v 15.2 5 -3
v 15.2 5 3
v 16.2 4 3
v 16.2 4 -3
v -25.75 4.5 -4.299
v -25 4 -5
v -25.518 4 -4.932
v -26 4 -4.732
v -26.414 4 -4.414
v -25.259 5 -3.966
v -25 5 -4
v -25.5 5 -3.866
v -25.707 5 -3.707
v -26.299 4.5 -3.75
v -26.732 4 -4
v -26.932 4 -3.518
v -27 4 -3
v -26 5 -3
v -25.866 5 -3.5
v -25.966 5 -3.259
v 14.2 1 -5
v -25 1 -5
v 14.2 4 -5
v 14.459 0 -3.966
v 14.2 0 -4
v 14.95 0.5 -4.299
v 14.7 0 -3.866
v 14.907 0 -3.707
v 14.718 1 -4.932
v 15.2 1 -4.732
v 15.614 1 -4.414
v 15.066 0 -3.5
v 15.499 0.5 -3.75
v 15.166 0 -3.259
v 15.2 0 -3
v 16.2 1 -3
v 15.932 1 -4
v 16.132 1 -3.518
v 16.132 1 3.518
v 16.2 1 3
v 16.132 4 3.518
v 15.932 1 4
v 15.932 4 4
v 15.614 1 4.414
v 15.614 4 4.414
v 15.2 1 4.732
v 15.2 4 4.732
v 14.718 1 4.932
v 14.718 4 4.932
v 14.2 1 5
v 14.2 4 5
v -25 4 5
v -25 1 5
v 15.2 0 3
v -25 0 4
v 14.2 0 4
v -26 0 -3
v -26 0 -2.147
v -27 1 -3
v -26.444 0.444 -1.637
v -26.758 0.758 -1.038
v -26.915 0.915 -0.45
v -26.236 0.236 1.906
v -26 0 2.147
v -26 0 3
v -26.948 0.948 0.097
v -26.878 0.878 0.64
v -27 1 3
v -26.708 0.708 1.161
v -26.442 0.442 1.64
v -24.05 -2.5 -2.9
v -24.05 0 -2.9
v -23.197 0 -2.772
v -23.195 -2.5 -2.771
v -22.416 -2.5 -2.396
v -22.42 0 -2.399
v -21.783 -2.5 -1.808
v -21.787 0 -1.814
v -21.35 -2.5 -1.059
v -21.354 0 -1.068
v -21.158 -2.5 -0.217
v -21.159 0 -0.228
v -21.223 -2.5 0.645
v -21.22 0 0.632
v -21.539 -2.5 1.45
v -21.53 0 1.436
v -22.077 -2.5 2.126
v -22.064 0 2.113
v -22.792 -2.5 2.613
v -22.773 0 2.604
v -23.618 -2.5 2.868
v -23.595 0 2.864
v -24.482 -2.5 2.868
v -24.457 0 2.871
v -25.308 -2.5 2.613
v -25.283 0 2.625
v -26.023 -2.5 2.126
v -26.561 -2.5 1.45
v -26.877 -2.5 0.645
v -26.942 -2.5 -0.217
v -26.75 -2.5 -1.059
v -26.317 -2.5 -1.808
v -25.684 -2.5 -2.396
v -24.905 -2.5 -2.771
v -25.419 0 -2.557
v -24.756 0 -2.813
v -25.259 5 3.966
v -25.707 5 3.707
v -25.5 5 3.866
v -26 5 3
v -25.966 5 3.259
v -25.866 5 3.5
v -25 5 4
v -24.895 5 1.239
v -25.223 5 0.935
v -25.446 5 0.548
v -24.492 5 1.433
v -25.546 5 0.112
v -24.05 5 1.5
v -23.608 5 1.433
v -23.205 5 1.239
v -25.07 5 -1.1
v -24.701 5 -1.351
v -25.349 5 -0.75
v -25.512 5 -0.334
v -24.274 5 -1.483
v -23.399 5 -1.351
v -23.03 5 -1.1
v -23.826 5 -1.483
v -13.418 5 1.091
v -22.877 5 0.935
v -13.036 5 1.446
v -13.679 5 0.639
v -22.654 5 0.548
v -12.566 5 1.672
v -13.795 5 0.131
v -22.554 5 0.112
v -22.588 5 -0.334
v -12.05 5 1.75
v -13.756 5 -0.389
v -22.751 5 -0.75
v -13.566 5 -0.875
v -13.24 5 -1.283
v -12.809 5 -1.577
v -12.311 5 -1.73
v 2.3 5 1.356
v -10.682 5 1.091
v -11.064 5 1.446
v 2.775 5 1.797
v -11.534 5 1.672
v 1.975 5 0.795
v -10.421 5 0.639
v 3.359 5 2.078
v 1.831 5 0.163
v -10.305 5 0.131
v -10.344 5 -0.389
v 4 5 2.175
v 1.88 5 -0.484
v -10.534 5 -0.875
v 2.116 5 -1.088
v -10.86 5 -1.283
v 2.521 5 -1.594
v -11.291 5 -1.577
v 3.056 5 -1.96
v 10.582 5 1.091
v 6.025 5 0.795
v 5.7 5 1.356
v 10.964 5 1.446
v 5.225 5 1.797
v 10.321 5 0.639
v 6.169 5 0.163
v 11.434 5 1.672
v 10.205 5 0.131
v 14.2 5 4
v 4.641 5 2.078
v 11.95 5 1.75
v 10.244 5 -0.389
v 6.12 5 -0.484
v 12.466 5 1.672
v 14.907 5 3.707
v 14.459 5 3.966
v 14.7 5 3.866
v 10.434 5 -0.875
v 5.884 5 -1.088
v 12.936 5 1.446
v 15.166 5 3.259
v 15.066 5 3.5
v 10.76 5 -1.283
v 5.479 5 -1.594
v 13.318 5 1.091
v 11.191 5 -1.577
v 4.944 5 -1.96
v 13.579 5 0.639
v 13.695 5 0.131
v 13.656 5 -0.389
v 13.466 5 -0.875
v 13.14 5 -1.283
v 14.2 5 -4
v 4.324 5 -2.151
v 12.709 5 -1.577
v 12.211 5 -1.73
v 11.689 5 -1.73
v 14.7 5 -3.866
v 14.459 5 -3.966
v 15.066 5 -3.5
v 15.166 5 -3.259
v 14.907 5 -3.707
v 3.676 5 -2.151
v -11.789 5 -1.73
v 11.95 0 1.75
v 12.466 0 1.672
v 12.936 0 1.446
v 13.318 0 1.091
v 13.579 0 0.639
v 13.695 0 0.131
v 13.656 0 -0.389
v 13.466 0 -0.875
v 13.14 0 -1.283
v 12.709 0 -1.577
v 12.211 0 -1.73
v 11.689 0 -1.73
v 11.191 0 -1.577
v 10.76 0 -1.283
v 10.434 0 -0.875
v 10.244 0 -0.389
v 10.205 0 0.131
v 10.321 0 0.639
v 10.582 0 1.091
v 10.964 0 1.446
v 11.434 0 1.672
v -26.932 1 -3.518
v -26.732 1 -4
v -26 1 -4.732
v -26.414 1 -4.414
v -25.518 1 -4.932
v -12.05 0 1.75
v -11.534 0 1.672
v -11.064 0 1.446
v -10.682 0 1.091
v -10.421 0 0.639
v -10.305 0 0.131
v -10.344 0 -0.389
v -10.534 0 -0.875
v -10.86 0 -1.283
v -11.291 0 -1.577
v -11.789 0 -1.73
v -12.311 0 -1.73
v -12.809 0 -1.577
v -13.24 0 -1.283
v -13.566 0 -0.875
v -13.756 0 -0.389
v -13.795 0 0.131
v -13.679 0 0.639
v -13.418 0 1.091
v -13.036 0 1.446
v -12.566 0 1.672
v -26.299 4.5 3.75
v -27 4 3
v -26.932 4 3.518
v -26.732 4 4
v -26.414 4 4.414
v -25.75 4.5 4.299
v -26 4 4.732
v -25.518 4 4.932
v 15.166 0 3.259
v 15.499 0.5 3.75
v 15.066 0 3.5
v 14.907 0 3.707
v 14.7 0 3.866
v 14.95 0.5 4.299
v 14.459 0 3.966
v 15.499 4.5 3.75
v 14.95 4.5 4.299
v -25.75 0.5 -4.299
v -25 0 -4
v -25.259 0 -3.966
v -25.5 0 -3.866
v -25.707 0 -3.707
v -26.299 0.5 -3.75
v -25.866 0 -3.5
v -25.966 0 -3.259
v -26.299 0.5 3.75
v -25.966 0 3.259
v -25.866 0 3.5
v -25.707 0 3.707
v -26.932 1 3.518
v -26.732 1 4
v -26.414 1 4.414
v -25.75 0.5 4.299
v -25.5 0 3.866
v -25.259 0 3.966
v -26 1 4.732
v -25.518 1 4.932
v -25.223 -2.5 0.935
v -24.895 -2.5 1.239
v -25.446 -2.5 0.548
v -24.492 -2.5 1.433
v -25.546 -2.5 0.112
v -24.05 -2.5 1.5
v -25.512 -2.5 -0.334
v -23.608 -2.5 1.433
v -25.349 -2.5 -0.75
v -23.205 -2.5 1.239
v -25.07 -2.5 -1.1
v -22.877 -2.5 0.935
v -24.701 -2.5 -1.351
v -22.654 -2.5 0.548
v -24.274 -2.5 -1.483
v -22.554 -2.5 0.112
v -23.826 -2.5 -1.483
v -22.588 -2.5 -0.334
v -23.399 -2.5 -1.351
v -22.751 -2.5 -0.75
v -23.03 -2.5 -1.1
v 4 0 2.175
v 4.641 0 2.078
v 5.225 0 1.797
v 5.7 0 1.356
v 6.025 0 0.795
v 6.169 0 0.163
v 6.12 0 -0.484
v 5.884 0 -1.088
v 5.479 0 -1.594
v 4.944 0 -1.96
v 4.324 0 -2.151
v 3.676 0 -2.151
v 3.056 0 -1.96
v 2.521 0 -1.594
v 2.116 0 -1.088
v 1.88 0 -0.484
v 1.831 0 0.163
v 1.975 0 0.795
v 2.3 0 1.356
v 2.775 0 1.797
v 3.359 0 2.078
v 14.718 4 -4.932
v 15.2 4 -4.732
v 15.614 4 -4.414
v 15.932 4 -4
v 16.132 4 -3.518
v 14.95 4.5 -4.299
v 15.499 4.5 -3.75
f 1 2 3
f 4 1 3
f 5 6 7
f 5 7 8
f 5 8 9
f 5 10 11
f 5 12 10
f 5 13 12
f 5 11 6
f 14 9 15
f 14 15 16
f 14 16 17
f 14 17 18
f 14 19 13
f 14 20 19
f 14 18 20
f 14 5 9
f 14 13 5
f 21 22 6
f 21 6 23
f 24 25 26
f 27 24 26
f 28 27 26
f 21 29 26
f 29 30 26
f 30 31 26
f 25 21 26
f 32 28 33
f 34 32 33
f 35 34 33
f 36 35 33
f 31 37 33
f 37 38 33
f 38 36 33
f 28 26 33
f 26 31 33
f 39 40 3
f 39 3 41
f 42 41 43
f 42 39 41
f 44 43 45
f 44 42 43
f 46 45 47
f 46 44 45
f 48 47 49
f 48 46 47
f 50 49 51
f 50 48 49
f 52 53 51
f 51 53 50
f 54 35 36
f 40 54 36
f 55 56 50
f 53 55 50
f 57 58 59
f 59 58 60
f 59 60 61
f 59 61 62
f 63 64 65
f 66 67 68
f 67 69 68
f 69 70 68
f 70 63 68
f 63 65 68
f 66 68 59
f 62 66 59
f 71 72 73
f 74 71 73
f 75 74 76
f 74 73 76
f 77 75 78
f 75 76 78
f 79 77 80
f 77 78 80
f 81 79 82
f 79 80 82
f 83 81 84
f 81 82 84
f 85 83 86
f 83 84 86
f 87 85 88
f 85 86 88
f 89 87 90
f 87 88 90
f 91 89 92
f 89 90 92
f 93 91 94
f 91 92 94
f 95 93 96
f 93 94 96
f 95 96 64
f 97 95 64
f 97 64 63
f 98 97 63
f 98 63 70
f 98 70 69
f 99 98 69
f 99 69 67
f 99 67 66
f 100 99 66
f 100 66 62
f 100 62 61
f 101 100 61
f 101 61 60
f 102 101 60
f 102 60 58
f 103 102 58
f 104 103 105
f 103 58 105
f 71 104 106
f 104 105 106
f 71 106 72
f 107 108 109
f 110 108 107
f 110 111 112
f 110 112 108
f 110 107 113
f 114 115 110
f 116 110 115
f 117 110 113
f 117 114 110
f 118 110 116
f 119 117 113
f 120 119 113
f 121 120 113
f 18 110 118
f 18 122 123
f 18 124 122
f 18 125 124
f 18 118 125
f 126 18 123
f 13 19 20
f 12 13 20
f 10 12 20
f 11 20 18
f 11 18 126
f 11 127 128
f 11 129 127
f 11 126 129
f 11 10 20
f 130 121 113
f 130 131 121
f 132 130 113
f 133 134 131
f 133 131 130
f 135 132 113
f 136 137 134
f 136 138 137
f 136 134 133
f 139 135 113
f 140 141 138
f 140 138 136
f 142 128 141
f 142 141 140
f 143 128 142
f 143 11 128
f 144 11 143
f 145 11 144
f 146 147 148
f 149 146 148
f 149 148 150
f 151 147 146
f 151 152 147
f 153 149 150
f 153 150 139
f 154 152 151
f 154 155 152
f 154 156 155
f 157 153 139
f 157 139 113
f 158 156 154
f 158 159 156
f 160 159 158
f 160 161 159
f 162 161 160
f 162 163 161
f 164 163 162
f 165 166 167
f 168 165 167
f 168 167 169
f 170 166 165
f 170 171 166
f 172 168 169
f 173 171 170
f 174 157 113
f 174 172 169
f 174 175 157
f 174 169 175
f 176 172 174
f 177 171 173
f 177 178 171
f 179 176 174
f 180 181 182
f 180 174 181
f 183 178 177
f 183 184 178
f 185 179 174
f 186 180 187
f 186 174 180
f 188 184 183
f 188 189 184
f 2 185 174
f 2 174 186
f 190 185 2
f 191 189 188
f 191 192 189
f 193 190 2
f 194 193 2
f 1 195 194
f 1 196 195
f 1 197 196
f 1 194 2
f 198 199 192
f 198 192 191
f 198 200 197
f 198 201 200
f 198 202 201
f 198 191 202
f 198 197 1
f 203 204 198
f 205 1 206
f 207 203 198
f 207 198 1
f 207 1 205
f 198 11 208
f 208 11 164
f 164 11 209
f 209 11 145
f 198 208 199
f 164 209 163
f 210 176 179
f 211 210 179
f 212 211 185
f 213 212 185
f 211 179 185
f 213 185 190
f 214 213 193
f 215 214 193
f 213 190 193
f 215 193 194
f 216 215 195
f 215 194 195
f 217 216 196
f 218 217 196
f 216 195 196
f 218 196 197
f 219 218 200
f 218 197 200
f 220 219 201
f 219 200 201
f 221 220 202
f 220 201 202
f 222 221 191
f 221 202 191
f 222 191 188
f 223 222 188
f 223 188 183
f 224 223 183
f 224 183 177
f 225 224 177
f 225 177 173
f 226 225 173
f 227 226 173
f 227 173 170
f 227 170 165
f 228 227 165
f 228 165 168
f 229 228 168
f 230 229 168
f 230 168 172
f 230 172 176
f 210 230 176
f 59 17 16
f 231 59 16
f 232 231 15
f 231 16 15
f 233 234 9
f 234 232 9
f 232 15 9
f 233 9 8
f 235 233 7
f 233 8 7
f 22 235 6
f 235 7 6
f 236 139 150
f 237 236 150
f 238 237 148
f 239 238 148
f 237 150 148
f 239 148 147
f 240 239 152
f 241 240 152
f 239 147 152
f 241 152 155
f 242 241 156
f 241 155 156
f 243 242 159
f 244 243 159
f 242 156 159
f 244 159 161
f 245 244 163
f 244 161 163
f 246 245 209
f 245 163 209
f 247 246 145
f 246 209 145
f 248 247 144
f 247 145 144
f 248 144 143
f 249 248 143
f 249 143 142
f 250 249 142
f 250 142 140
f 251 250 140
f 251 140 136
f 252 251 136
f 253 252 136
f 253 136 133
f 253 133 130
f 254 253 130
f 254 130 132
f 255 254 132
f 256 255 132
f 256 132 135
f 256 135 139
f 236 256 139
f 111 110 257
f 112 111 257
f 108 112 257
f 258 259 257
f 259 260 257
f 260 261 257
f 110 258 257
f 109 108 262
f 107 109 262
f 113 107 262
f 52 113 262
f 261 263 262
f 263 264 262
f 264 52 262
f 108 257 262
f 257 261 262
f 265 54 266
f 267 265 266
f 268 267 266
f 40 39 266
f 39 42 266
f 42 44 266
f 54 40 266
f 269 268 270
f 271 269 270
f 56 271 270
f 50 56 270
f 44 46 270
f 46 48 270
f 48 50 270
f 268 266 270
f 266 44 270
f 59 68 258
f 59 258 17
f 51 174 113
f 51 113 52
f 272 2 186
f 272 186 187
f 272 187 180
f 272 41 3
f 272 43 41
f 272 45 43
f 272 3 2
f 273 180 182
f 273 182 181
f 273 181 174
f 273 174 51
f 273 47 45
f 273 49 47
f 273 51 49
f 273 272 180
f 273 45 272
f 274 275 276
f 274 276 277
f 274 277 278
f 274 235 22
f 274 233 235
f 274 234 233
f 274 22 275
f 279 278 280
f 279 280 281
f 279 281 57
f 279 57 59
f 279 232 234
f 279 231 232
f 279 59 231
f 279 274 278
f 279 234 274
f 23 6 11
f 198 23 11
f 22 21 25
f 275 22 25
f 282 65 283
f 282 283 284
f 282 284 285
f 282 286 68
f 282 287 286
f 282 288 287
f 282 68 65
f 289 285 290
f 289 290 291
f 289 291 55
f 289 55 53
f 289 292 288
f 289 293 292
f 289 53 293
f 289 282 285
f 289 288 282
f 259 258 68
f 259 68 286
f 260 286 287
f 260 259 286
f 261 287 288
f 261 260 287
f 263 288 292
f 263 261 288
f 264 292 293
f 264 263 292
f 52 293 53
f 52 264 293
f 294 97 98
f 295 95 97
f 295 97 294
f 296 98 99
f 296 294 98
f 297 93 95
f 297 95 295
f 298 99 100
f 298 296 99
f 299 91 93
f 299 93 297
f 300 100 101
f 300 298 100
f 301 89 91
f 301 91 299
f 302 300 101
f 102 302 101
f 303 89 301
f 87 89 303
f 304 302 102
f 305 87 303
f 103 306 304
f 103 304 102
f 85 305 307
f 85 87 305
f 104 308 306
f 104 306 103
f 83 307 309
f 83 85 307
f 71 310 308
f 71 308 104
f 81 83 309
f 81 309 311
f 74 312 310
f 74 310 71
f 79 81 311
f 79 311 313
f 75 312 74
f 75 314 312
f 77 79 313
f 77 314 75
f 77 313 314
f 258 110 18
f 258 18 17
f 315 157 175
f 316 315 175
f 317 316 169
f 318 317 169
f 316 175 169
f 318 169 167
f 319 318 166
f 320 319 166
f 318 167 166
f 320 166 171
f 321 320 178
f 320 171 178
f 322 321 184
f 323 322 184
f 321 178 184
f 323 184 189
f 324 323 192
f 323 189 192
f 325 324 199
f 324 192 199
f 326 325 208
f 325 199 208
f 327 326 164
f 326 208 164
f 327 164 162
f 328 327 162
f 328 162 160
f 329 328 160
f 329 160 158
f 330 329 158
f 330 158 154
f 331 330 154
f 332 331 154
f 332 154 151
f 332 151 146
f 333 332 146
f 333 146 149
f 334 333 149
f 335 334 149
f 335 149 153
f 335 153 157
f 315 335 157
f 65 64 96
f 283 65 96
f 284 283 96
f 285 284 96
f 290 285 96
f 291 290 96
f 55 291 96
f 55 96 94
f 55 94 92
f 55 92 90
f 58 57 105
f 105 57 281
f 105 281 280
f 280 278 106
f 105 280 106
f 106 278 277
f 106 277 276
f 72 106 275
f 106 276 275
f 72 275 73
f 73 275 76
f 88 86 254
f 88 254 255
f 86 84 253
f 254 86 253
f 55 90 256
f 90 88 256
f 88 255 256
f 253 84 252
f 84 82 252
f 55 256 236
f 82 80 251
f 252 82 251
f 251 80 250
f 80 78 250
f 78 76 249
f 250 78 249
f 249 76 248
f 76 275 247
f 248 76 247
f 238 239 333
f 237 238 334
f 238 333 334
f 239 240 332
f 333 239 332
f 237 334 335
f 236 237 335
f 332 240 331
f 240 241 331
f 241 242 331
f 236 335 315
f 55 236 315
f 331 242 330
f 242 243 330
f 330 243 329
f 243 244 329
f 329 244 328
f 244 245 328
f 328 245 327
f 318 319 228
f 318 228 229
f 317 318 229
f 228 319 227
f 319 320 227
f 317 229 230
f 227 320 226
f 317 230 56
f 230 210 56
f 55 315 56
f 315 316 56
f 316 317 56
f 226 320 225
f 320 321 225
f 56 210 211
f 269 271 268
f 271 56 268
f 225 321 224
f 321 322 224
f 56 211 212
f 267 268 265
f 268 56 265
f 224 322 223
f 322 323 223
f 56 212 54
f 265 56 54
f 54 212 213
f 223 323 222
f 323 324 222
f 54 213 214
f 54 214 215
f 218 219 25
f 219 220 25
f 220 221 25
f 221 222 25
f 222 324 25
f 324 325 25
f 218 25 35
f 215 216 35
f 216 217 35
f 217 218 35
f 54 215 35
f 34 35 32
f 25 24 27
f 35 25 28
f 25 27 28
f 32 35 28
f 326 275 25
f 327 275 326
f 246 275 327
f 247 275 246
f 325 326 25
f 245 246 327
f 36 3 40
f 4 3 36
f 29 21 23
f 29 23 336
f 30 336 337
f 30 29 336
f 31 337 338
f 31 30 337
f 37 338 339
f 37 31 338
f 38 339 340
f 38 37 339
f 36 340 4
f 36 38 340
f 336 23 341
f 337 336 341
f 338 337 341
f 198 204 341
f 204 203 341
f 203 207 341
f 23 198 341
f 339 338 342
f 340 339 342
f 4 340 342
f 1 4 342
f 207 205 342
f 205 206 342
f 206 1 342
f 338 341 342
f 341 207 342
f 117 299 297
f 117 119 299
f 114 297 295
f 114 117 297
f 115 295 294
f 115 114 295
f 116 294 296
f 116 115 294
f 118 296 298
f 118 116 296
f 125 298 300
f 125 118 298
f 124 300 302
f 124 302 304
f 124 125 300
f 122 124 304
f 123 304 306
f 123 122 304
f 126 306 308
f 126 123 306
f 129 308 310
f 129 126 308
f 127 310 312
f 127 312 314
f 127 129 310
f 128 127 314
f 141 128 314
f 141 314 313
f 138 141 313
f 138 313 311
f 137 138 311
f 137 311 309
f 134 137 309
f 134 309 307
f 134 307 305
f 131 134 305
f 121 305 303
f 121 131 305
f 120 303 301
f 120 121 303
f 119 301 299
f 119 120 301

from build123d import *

# Parameters (mm, degrees)
SKETCH1_W           = 54
SKETCH1_H           = 10
BOSS_EXTRUDE1_DEPTH = 5
SKETCH3_R           = 1.5
SKETCH3_R_2         = 2.175
SKETCH3_R_3         = 1.75
CUT_EXTRUDE1_DEPTH  = 7
FILLET1_R           = 2
SKETCH4_R           = 2.9
SKETCH4_R_2         = 1.5
BOSS_EXTRUDE2_DEPTH = 2.5
SKETCH5_W           = 14.628032649
SKETCH5_H           = 11.072623212
CUT_EXTRUDE2_DEPTH  = 10
FILLET2_R           = 2
CHAMFER1_SIZE       = 1


with BuildPart() as part:
    # Sketch1 → Boss-Extrude1 (new body)
    with BuildSketch(Plane(origin=(0, 0, 0), x_dir=(1, 0, 0), z_dir=(0, 1, 0))):
        Rectangle(SKETCH1_W, SKETCH1_H)
    extrude(amount=BOSS_EXTRUDE1_DEPTH)

    # Sketch3 → Cut-Extrude1 (cut)
    with BuildSketch(Plane(origin=(0, 5, 0), x_dir=(1, 0, 0), z_dir=(0, 1, 0))):
        with Locations(Location((-24.05, 0, 0), (0, 0, 270))):
            Circle(SKETCH3_R)
        with Locations(Location((4, 0, 0), (0, 0, 270))):
            Circle(SKETCH3_R_2)
        with Locations(Location((-12.05, 0, 0), (0, 0, 270))):
            Circle(SKETCH3_R_3)
        with Locations(Location((11.95, 0, 0), (0, 0, 270))):
            Circle(SKETCH3_R_3)
    extrude(amount=-CUT_EXTRUDE1_DEPTH, mode=Mode.SUBTRACT)

    # Fillet1
    fillet1_edges = [part.edges().sort_by_distance(p)[0] for p in [
        (27, 2.5, 5),
        (-27, 2.5, 5),
        (-27, 2.5, -5),
        (27, 2.5, -5),
    ]]
    fillet(fillet1_edges, radius=FILLET1_R)

    # Sketch4 → Boss-Extrude2 (add)
    with BuildSketch(Plane.XZ):
        with Locations(Location((-24.05, 0, 0), (0, 0, 270))):
            Circle(SKETCH4_R)
        with Locations(Location((-24.05, 0, 0), (0, 0, 90))):
            Circle(SKETCH4_R_2, mode=Mode.SUBTRACT)
    extrude(amount=BOSS_EXTRUDE2_DEPTH)

    # Sketch5 → Cut-Extrude2 (cut)
    with BuildSketch(Plane(origin=(0, 5, 0), x_dir=(1, 0, 0), z_dir=(0, 1, 0))):
        with Locations((23.514016324, -0.536311606)):
            Rectangle(SKETCH5_W, SKETCH5_H)
    extrude(amount=-CUT_EXTRUDE2_DEPTH, mode=Mode.SUBTRACT)

    # Fillet2
    fillet2_edges = [part.edges().sort_by_distance(p)[0] for p in [
        (16.2, 2.5, 5),
        (16.2, 2.5, -5),
    ]]
    fillet(fillet2_edges, radius=FILLET2_R)

    # Chamfer1
    # the kernel refuses this chamfer: 1 mm, written as the material it takes off along each edge
    with BuildSketch(Plane(origin=(14.2, 0, -3), x_dir=(0, 0, -1), z_dir=(-1, 0, 0))) as chamfer1_piece_1:
        Polygon((2 - CHAMFER1_SIZE, 0), (2, -CHAMFER1_SIZE), (2, 0), align=None)
    revolve(axis=Axis((14.2, 0, -3), (0, -1, 0)), revolution_arc=90, mode=Mode.SUBTRACT)
    with BuildSketch(Plane(origin=(14.2, 0, 5), x_dir=(0, -0.027495876610586365, -0.9996219169112968), z_dir=(-1, 0, 0)), Plane(origin=(-25, 5, -5), x_dir=(0, -0.9996219169112968, -0.027495876610586487), z_dir=(1, 0, 0))) as chamfer1_piece_2:
        Polygon((CHAMFER1_SIZE * 0.999621916911, -CHAMFER1_SIZE * 0.0274958766106), (-CHAMFER1_SIZE * 0.0274958766106, -CHAMFER1_SIZE * 0.999621916911), (0, 0), align=None)
    extrude(amount=39.2, mode=Mode.SUBTRACT)
    with BuildSketch(Plane(origin=(-27, 0, 3), x_dir=(0.9996219169112968, -0.02749587661058639, 0), z_dir=(0, 0, -1))) as chamfer1_piece_3_section:
        Polygon((CHAMFER1_SIZE * 0.999621916911, -CHAMFER1_SIZE * 0.0274958766106), (-CHAMFER1_SIZE * 0.0274958766106, -CHAMFER1_SIZE * 0.999621916911), (0, 0), align=None)
    chamfer1_piece_3 = extrude(amount=6, mode=Mode.PRIVATE)
    chamfer1_piece_3 = chamfer1_piece_3 - Plane(origin=(-24.05, 0.490897833, 0), x_dir=(0, 0, -1), z_dir=(0, 1, 0)) * Cylinder(2.9, 16, mode=Mode.PRIVATE)
    add(chamfer1_piece_3, mode=Mode.SUBTRACT)
    with BuildSketch(Plane(origin=(-25, 0, 3), x_dir=(-1, 0, 0), z_dir=(0, 0, -1))) as chamfer1_piece_4:
        Polygon((2 - CHAMFER1_SIZE, 0), (2, CHAMFER1_SIZE), (2, 0), align=None)
    revolve(axis=Axis((-25, 0, 3), (0, 1, 0)), revolution_arc=90, mode=Mode.SUBTRACT)
    with BuildSketch(Plane(origin=(-25, 0, -3), x_dir=(0, 0, -1), z_dir=(1, 0, 0))) as chamfer1_piece_5:
        Polygon((2 - CHAMFER1_SIZE, 0), (2, CHAMFER1_SIZE), (2, 0), align=None)
    revolve(axis=Axis((-25, 0, -3), (0, 1, 0)), revolution_arc=90, mode=Mode.SUBTRACT)
    with BuildSketch(Plane(origin=(-27, 5, 3), x_dir=(0.9996219169112968, 0.02749587661058651, 0), z_dir=(0, 0, -1))) as chamfer1_piece_6:
        Polygon((CHAMFER1_SIZE * 0.999621916911, CHAMFER1_SIZE * 0.0274958766106), (-CHAMFER1_SIZE * 0.0274958766106, CHAMFER1_SIZE * 0.999621916911), (0, 0), align=None)
    extrude(amount=6, mode=Mode.SUBTRACT)
    with BuildSketch(Plane(origin=(14.2, 5, 5), x_dir=(0, 0.027495876610586487, -0.9996219169112968), z_dir=(-1, 0, 0)), Plane(origin=(-25, 0, -5), x_dir=(0, 0.9996219169112968, -0.027495876610586494), z_dir=(1, 0, 0))) as chamfer1_piece_7:
        Polygon((CHAMFER1_SIZE * 0.999621916911, CHAMFER1_SIZE * 0.0274958766106), (-CHAMFER1_SIZE * 0.0274958766106, CHAMFER1_SIZE * 0.999621916911), (0, 0), align=None)
    extrude(amount=39.2, mode=Mode.SUBTRACT)
    with BuildSketch(Plane(origin=(-25, 5, 3), x_dir=(-1, 0, 0), z_dir=(0, 0, -1))) as chamfer1_piece_8:
        Polygon((2 - CHAMFER1_SIZE, 0), (2, -CHAMFER1_SIZE), (2, 0), align=None)
    revolve(axis=Axis((-25, 5, 3), (0, 1, 0)), revolution_arc=90, mode=Mode.SUBTRACT)
    with BuildSketch(Plane(origin=(-25, 5, -3), x_dir=(0, 0, -1), z_dir=(1, 0, 0))) as chamfer1_piece_9:
        Polygon((2, -CHAMFER1_SIZE), (2 - CHAMFER1_SIZE, 0), (2, 0), align=None)
    revolve(axis=Axis((-25, 5, -3), (0, 1, 0)), revolution_arc=90, mode=Mode.SUBTRACT)
    with BuildSketch(Plane(origin=(16.2, 0, -3), x_dir=(-0.9996219169112968, -0.02749587661058639, 0), z_dir=(0, 0, 1)), Plane(origin=(16.2, 5, 3), x_dir=(-0.9996219169112968, 0.02749587661058651, 0), z_dir=(0, 0, -1))) as chamfer1_piece_10:
        Polygon((CHAMFER1_SIZE * 0.999621916911, -CHAMFER1_SIZE * 0.0274958766106), (-CHAMFER1_SIZE * 0.0274958766106, -CHAMFER1_SIZE * 0.999621916911), (0, 0), align=None)
    extrude(amount=6, mode=Mode.SUBTRACT)
    with BuildSketch(Plane(origin=(14.2, 5, 3), x_dir=(1, 0, 0), z_dir=(0, 0, -1))) as chamfer1_piece_11:
        Polygon((2 - CHAMFER1_SIZE, 0), (2, CHAMFER1_SIZE), (2, 0), align=None)
    revolve(axis=Axis((14.2, 5, 3), (0, -1, 0)), revolution_arc=90, mode=Mode.SUBTRACT)
    with BuildSketch(Plane(origin=(14.2, 5, -3), x_dir=(0, 0, -1), z_dir=(-1, 0, 0))) as chamfer1_piece_12:
        Polygon((2, CHAMFER1_SIZE), (2 - CHAMFER1_SIZE, 0), (2, 0), align=None)
    revolve(axis=Axis((14.2, 5, -3), (0, -1, 0)), revolution_arc=90, mode=Mode.SUBTRACT)
    with BuildSketch(Plane(origin=(14.2, 0, 3), x_dir=(1, 0, 0), z_dir=(0, 0, -1))) as chamfer1_piece_13:
        Polygon((2 - CHAMFER1_SIZE, 0), (2, -CHAMFER1_SIZE), (2, 0), align=None)
    revolve(axis=Axis((14.2, 0, 3), (0, -1, 0)), revolution_arc=90, mode=Mode.SUBTRACT)


solid = part.part
